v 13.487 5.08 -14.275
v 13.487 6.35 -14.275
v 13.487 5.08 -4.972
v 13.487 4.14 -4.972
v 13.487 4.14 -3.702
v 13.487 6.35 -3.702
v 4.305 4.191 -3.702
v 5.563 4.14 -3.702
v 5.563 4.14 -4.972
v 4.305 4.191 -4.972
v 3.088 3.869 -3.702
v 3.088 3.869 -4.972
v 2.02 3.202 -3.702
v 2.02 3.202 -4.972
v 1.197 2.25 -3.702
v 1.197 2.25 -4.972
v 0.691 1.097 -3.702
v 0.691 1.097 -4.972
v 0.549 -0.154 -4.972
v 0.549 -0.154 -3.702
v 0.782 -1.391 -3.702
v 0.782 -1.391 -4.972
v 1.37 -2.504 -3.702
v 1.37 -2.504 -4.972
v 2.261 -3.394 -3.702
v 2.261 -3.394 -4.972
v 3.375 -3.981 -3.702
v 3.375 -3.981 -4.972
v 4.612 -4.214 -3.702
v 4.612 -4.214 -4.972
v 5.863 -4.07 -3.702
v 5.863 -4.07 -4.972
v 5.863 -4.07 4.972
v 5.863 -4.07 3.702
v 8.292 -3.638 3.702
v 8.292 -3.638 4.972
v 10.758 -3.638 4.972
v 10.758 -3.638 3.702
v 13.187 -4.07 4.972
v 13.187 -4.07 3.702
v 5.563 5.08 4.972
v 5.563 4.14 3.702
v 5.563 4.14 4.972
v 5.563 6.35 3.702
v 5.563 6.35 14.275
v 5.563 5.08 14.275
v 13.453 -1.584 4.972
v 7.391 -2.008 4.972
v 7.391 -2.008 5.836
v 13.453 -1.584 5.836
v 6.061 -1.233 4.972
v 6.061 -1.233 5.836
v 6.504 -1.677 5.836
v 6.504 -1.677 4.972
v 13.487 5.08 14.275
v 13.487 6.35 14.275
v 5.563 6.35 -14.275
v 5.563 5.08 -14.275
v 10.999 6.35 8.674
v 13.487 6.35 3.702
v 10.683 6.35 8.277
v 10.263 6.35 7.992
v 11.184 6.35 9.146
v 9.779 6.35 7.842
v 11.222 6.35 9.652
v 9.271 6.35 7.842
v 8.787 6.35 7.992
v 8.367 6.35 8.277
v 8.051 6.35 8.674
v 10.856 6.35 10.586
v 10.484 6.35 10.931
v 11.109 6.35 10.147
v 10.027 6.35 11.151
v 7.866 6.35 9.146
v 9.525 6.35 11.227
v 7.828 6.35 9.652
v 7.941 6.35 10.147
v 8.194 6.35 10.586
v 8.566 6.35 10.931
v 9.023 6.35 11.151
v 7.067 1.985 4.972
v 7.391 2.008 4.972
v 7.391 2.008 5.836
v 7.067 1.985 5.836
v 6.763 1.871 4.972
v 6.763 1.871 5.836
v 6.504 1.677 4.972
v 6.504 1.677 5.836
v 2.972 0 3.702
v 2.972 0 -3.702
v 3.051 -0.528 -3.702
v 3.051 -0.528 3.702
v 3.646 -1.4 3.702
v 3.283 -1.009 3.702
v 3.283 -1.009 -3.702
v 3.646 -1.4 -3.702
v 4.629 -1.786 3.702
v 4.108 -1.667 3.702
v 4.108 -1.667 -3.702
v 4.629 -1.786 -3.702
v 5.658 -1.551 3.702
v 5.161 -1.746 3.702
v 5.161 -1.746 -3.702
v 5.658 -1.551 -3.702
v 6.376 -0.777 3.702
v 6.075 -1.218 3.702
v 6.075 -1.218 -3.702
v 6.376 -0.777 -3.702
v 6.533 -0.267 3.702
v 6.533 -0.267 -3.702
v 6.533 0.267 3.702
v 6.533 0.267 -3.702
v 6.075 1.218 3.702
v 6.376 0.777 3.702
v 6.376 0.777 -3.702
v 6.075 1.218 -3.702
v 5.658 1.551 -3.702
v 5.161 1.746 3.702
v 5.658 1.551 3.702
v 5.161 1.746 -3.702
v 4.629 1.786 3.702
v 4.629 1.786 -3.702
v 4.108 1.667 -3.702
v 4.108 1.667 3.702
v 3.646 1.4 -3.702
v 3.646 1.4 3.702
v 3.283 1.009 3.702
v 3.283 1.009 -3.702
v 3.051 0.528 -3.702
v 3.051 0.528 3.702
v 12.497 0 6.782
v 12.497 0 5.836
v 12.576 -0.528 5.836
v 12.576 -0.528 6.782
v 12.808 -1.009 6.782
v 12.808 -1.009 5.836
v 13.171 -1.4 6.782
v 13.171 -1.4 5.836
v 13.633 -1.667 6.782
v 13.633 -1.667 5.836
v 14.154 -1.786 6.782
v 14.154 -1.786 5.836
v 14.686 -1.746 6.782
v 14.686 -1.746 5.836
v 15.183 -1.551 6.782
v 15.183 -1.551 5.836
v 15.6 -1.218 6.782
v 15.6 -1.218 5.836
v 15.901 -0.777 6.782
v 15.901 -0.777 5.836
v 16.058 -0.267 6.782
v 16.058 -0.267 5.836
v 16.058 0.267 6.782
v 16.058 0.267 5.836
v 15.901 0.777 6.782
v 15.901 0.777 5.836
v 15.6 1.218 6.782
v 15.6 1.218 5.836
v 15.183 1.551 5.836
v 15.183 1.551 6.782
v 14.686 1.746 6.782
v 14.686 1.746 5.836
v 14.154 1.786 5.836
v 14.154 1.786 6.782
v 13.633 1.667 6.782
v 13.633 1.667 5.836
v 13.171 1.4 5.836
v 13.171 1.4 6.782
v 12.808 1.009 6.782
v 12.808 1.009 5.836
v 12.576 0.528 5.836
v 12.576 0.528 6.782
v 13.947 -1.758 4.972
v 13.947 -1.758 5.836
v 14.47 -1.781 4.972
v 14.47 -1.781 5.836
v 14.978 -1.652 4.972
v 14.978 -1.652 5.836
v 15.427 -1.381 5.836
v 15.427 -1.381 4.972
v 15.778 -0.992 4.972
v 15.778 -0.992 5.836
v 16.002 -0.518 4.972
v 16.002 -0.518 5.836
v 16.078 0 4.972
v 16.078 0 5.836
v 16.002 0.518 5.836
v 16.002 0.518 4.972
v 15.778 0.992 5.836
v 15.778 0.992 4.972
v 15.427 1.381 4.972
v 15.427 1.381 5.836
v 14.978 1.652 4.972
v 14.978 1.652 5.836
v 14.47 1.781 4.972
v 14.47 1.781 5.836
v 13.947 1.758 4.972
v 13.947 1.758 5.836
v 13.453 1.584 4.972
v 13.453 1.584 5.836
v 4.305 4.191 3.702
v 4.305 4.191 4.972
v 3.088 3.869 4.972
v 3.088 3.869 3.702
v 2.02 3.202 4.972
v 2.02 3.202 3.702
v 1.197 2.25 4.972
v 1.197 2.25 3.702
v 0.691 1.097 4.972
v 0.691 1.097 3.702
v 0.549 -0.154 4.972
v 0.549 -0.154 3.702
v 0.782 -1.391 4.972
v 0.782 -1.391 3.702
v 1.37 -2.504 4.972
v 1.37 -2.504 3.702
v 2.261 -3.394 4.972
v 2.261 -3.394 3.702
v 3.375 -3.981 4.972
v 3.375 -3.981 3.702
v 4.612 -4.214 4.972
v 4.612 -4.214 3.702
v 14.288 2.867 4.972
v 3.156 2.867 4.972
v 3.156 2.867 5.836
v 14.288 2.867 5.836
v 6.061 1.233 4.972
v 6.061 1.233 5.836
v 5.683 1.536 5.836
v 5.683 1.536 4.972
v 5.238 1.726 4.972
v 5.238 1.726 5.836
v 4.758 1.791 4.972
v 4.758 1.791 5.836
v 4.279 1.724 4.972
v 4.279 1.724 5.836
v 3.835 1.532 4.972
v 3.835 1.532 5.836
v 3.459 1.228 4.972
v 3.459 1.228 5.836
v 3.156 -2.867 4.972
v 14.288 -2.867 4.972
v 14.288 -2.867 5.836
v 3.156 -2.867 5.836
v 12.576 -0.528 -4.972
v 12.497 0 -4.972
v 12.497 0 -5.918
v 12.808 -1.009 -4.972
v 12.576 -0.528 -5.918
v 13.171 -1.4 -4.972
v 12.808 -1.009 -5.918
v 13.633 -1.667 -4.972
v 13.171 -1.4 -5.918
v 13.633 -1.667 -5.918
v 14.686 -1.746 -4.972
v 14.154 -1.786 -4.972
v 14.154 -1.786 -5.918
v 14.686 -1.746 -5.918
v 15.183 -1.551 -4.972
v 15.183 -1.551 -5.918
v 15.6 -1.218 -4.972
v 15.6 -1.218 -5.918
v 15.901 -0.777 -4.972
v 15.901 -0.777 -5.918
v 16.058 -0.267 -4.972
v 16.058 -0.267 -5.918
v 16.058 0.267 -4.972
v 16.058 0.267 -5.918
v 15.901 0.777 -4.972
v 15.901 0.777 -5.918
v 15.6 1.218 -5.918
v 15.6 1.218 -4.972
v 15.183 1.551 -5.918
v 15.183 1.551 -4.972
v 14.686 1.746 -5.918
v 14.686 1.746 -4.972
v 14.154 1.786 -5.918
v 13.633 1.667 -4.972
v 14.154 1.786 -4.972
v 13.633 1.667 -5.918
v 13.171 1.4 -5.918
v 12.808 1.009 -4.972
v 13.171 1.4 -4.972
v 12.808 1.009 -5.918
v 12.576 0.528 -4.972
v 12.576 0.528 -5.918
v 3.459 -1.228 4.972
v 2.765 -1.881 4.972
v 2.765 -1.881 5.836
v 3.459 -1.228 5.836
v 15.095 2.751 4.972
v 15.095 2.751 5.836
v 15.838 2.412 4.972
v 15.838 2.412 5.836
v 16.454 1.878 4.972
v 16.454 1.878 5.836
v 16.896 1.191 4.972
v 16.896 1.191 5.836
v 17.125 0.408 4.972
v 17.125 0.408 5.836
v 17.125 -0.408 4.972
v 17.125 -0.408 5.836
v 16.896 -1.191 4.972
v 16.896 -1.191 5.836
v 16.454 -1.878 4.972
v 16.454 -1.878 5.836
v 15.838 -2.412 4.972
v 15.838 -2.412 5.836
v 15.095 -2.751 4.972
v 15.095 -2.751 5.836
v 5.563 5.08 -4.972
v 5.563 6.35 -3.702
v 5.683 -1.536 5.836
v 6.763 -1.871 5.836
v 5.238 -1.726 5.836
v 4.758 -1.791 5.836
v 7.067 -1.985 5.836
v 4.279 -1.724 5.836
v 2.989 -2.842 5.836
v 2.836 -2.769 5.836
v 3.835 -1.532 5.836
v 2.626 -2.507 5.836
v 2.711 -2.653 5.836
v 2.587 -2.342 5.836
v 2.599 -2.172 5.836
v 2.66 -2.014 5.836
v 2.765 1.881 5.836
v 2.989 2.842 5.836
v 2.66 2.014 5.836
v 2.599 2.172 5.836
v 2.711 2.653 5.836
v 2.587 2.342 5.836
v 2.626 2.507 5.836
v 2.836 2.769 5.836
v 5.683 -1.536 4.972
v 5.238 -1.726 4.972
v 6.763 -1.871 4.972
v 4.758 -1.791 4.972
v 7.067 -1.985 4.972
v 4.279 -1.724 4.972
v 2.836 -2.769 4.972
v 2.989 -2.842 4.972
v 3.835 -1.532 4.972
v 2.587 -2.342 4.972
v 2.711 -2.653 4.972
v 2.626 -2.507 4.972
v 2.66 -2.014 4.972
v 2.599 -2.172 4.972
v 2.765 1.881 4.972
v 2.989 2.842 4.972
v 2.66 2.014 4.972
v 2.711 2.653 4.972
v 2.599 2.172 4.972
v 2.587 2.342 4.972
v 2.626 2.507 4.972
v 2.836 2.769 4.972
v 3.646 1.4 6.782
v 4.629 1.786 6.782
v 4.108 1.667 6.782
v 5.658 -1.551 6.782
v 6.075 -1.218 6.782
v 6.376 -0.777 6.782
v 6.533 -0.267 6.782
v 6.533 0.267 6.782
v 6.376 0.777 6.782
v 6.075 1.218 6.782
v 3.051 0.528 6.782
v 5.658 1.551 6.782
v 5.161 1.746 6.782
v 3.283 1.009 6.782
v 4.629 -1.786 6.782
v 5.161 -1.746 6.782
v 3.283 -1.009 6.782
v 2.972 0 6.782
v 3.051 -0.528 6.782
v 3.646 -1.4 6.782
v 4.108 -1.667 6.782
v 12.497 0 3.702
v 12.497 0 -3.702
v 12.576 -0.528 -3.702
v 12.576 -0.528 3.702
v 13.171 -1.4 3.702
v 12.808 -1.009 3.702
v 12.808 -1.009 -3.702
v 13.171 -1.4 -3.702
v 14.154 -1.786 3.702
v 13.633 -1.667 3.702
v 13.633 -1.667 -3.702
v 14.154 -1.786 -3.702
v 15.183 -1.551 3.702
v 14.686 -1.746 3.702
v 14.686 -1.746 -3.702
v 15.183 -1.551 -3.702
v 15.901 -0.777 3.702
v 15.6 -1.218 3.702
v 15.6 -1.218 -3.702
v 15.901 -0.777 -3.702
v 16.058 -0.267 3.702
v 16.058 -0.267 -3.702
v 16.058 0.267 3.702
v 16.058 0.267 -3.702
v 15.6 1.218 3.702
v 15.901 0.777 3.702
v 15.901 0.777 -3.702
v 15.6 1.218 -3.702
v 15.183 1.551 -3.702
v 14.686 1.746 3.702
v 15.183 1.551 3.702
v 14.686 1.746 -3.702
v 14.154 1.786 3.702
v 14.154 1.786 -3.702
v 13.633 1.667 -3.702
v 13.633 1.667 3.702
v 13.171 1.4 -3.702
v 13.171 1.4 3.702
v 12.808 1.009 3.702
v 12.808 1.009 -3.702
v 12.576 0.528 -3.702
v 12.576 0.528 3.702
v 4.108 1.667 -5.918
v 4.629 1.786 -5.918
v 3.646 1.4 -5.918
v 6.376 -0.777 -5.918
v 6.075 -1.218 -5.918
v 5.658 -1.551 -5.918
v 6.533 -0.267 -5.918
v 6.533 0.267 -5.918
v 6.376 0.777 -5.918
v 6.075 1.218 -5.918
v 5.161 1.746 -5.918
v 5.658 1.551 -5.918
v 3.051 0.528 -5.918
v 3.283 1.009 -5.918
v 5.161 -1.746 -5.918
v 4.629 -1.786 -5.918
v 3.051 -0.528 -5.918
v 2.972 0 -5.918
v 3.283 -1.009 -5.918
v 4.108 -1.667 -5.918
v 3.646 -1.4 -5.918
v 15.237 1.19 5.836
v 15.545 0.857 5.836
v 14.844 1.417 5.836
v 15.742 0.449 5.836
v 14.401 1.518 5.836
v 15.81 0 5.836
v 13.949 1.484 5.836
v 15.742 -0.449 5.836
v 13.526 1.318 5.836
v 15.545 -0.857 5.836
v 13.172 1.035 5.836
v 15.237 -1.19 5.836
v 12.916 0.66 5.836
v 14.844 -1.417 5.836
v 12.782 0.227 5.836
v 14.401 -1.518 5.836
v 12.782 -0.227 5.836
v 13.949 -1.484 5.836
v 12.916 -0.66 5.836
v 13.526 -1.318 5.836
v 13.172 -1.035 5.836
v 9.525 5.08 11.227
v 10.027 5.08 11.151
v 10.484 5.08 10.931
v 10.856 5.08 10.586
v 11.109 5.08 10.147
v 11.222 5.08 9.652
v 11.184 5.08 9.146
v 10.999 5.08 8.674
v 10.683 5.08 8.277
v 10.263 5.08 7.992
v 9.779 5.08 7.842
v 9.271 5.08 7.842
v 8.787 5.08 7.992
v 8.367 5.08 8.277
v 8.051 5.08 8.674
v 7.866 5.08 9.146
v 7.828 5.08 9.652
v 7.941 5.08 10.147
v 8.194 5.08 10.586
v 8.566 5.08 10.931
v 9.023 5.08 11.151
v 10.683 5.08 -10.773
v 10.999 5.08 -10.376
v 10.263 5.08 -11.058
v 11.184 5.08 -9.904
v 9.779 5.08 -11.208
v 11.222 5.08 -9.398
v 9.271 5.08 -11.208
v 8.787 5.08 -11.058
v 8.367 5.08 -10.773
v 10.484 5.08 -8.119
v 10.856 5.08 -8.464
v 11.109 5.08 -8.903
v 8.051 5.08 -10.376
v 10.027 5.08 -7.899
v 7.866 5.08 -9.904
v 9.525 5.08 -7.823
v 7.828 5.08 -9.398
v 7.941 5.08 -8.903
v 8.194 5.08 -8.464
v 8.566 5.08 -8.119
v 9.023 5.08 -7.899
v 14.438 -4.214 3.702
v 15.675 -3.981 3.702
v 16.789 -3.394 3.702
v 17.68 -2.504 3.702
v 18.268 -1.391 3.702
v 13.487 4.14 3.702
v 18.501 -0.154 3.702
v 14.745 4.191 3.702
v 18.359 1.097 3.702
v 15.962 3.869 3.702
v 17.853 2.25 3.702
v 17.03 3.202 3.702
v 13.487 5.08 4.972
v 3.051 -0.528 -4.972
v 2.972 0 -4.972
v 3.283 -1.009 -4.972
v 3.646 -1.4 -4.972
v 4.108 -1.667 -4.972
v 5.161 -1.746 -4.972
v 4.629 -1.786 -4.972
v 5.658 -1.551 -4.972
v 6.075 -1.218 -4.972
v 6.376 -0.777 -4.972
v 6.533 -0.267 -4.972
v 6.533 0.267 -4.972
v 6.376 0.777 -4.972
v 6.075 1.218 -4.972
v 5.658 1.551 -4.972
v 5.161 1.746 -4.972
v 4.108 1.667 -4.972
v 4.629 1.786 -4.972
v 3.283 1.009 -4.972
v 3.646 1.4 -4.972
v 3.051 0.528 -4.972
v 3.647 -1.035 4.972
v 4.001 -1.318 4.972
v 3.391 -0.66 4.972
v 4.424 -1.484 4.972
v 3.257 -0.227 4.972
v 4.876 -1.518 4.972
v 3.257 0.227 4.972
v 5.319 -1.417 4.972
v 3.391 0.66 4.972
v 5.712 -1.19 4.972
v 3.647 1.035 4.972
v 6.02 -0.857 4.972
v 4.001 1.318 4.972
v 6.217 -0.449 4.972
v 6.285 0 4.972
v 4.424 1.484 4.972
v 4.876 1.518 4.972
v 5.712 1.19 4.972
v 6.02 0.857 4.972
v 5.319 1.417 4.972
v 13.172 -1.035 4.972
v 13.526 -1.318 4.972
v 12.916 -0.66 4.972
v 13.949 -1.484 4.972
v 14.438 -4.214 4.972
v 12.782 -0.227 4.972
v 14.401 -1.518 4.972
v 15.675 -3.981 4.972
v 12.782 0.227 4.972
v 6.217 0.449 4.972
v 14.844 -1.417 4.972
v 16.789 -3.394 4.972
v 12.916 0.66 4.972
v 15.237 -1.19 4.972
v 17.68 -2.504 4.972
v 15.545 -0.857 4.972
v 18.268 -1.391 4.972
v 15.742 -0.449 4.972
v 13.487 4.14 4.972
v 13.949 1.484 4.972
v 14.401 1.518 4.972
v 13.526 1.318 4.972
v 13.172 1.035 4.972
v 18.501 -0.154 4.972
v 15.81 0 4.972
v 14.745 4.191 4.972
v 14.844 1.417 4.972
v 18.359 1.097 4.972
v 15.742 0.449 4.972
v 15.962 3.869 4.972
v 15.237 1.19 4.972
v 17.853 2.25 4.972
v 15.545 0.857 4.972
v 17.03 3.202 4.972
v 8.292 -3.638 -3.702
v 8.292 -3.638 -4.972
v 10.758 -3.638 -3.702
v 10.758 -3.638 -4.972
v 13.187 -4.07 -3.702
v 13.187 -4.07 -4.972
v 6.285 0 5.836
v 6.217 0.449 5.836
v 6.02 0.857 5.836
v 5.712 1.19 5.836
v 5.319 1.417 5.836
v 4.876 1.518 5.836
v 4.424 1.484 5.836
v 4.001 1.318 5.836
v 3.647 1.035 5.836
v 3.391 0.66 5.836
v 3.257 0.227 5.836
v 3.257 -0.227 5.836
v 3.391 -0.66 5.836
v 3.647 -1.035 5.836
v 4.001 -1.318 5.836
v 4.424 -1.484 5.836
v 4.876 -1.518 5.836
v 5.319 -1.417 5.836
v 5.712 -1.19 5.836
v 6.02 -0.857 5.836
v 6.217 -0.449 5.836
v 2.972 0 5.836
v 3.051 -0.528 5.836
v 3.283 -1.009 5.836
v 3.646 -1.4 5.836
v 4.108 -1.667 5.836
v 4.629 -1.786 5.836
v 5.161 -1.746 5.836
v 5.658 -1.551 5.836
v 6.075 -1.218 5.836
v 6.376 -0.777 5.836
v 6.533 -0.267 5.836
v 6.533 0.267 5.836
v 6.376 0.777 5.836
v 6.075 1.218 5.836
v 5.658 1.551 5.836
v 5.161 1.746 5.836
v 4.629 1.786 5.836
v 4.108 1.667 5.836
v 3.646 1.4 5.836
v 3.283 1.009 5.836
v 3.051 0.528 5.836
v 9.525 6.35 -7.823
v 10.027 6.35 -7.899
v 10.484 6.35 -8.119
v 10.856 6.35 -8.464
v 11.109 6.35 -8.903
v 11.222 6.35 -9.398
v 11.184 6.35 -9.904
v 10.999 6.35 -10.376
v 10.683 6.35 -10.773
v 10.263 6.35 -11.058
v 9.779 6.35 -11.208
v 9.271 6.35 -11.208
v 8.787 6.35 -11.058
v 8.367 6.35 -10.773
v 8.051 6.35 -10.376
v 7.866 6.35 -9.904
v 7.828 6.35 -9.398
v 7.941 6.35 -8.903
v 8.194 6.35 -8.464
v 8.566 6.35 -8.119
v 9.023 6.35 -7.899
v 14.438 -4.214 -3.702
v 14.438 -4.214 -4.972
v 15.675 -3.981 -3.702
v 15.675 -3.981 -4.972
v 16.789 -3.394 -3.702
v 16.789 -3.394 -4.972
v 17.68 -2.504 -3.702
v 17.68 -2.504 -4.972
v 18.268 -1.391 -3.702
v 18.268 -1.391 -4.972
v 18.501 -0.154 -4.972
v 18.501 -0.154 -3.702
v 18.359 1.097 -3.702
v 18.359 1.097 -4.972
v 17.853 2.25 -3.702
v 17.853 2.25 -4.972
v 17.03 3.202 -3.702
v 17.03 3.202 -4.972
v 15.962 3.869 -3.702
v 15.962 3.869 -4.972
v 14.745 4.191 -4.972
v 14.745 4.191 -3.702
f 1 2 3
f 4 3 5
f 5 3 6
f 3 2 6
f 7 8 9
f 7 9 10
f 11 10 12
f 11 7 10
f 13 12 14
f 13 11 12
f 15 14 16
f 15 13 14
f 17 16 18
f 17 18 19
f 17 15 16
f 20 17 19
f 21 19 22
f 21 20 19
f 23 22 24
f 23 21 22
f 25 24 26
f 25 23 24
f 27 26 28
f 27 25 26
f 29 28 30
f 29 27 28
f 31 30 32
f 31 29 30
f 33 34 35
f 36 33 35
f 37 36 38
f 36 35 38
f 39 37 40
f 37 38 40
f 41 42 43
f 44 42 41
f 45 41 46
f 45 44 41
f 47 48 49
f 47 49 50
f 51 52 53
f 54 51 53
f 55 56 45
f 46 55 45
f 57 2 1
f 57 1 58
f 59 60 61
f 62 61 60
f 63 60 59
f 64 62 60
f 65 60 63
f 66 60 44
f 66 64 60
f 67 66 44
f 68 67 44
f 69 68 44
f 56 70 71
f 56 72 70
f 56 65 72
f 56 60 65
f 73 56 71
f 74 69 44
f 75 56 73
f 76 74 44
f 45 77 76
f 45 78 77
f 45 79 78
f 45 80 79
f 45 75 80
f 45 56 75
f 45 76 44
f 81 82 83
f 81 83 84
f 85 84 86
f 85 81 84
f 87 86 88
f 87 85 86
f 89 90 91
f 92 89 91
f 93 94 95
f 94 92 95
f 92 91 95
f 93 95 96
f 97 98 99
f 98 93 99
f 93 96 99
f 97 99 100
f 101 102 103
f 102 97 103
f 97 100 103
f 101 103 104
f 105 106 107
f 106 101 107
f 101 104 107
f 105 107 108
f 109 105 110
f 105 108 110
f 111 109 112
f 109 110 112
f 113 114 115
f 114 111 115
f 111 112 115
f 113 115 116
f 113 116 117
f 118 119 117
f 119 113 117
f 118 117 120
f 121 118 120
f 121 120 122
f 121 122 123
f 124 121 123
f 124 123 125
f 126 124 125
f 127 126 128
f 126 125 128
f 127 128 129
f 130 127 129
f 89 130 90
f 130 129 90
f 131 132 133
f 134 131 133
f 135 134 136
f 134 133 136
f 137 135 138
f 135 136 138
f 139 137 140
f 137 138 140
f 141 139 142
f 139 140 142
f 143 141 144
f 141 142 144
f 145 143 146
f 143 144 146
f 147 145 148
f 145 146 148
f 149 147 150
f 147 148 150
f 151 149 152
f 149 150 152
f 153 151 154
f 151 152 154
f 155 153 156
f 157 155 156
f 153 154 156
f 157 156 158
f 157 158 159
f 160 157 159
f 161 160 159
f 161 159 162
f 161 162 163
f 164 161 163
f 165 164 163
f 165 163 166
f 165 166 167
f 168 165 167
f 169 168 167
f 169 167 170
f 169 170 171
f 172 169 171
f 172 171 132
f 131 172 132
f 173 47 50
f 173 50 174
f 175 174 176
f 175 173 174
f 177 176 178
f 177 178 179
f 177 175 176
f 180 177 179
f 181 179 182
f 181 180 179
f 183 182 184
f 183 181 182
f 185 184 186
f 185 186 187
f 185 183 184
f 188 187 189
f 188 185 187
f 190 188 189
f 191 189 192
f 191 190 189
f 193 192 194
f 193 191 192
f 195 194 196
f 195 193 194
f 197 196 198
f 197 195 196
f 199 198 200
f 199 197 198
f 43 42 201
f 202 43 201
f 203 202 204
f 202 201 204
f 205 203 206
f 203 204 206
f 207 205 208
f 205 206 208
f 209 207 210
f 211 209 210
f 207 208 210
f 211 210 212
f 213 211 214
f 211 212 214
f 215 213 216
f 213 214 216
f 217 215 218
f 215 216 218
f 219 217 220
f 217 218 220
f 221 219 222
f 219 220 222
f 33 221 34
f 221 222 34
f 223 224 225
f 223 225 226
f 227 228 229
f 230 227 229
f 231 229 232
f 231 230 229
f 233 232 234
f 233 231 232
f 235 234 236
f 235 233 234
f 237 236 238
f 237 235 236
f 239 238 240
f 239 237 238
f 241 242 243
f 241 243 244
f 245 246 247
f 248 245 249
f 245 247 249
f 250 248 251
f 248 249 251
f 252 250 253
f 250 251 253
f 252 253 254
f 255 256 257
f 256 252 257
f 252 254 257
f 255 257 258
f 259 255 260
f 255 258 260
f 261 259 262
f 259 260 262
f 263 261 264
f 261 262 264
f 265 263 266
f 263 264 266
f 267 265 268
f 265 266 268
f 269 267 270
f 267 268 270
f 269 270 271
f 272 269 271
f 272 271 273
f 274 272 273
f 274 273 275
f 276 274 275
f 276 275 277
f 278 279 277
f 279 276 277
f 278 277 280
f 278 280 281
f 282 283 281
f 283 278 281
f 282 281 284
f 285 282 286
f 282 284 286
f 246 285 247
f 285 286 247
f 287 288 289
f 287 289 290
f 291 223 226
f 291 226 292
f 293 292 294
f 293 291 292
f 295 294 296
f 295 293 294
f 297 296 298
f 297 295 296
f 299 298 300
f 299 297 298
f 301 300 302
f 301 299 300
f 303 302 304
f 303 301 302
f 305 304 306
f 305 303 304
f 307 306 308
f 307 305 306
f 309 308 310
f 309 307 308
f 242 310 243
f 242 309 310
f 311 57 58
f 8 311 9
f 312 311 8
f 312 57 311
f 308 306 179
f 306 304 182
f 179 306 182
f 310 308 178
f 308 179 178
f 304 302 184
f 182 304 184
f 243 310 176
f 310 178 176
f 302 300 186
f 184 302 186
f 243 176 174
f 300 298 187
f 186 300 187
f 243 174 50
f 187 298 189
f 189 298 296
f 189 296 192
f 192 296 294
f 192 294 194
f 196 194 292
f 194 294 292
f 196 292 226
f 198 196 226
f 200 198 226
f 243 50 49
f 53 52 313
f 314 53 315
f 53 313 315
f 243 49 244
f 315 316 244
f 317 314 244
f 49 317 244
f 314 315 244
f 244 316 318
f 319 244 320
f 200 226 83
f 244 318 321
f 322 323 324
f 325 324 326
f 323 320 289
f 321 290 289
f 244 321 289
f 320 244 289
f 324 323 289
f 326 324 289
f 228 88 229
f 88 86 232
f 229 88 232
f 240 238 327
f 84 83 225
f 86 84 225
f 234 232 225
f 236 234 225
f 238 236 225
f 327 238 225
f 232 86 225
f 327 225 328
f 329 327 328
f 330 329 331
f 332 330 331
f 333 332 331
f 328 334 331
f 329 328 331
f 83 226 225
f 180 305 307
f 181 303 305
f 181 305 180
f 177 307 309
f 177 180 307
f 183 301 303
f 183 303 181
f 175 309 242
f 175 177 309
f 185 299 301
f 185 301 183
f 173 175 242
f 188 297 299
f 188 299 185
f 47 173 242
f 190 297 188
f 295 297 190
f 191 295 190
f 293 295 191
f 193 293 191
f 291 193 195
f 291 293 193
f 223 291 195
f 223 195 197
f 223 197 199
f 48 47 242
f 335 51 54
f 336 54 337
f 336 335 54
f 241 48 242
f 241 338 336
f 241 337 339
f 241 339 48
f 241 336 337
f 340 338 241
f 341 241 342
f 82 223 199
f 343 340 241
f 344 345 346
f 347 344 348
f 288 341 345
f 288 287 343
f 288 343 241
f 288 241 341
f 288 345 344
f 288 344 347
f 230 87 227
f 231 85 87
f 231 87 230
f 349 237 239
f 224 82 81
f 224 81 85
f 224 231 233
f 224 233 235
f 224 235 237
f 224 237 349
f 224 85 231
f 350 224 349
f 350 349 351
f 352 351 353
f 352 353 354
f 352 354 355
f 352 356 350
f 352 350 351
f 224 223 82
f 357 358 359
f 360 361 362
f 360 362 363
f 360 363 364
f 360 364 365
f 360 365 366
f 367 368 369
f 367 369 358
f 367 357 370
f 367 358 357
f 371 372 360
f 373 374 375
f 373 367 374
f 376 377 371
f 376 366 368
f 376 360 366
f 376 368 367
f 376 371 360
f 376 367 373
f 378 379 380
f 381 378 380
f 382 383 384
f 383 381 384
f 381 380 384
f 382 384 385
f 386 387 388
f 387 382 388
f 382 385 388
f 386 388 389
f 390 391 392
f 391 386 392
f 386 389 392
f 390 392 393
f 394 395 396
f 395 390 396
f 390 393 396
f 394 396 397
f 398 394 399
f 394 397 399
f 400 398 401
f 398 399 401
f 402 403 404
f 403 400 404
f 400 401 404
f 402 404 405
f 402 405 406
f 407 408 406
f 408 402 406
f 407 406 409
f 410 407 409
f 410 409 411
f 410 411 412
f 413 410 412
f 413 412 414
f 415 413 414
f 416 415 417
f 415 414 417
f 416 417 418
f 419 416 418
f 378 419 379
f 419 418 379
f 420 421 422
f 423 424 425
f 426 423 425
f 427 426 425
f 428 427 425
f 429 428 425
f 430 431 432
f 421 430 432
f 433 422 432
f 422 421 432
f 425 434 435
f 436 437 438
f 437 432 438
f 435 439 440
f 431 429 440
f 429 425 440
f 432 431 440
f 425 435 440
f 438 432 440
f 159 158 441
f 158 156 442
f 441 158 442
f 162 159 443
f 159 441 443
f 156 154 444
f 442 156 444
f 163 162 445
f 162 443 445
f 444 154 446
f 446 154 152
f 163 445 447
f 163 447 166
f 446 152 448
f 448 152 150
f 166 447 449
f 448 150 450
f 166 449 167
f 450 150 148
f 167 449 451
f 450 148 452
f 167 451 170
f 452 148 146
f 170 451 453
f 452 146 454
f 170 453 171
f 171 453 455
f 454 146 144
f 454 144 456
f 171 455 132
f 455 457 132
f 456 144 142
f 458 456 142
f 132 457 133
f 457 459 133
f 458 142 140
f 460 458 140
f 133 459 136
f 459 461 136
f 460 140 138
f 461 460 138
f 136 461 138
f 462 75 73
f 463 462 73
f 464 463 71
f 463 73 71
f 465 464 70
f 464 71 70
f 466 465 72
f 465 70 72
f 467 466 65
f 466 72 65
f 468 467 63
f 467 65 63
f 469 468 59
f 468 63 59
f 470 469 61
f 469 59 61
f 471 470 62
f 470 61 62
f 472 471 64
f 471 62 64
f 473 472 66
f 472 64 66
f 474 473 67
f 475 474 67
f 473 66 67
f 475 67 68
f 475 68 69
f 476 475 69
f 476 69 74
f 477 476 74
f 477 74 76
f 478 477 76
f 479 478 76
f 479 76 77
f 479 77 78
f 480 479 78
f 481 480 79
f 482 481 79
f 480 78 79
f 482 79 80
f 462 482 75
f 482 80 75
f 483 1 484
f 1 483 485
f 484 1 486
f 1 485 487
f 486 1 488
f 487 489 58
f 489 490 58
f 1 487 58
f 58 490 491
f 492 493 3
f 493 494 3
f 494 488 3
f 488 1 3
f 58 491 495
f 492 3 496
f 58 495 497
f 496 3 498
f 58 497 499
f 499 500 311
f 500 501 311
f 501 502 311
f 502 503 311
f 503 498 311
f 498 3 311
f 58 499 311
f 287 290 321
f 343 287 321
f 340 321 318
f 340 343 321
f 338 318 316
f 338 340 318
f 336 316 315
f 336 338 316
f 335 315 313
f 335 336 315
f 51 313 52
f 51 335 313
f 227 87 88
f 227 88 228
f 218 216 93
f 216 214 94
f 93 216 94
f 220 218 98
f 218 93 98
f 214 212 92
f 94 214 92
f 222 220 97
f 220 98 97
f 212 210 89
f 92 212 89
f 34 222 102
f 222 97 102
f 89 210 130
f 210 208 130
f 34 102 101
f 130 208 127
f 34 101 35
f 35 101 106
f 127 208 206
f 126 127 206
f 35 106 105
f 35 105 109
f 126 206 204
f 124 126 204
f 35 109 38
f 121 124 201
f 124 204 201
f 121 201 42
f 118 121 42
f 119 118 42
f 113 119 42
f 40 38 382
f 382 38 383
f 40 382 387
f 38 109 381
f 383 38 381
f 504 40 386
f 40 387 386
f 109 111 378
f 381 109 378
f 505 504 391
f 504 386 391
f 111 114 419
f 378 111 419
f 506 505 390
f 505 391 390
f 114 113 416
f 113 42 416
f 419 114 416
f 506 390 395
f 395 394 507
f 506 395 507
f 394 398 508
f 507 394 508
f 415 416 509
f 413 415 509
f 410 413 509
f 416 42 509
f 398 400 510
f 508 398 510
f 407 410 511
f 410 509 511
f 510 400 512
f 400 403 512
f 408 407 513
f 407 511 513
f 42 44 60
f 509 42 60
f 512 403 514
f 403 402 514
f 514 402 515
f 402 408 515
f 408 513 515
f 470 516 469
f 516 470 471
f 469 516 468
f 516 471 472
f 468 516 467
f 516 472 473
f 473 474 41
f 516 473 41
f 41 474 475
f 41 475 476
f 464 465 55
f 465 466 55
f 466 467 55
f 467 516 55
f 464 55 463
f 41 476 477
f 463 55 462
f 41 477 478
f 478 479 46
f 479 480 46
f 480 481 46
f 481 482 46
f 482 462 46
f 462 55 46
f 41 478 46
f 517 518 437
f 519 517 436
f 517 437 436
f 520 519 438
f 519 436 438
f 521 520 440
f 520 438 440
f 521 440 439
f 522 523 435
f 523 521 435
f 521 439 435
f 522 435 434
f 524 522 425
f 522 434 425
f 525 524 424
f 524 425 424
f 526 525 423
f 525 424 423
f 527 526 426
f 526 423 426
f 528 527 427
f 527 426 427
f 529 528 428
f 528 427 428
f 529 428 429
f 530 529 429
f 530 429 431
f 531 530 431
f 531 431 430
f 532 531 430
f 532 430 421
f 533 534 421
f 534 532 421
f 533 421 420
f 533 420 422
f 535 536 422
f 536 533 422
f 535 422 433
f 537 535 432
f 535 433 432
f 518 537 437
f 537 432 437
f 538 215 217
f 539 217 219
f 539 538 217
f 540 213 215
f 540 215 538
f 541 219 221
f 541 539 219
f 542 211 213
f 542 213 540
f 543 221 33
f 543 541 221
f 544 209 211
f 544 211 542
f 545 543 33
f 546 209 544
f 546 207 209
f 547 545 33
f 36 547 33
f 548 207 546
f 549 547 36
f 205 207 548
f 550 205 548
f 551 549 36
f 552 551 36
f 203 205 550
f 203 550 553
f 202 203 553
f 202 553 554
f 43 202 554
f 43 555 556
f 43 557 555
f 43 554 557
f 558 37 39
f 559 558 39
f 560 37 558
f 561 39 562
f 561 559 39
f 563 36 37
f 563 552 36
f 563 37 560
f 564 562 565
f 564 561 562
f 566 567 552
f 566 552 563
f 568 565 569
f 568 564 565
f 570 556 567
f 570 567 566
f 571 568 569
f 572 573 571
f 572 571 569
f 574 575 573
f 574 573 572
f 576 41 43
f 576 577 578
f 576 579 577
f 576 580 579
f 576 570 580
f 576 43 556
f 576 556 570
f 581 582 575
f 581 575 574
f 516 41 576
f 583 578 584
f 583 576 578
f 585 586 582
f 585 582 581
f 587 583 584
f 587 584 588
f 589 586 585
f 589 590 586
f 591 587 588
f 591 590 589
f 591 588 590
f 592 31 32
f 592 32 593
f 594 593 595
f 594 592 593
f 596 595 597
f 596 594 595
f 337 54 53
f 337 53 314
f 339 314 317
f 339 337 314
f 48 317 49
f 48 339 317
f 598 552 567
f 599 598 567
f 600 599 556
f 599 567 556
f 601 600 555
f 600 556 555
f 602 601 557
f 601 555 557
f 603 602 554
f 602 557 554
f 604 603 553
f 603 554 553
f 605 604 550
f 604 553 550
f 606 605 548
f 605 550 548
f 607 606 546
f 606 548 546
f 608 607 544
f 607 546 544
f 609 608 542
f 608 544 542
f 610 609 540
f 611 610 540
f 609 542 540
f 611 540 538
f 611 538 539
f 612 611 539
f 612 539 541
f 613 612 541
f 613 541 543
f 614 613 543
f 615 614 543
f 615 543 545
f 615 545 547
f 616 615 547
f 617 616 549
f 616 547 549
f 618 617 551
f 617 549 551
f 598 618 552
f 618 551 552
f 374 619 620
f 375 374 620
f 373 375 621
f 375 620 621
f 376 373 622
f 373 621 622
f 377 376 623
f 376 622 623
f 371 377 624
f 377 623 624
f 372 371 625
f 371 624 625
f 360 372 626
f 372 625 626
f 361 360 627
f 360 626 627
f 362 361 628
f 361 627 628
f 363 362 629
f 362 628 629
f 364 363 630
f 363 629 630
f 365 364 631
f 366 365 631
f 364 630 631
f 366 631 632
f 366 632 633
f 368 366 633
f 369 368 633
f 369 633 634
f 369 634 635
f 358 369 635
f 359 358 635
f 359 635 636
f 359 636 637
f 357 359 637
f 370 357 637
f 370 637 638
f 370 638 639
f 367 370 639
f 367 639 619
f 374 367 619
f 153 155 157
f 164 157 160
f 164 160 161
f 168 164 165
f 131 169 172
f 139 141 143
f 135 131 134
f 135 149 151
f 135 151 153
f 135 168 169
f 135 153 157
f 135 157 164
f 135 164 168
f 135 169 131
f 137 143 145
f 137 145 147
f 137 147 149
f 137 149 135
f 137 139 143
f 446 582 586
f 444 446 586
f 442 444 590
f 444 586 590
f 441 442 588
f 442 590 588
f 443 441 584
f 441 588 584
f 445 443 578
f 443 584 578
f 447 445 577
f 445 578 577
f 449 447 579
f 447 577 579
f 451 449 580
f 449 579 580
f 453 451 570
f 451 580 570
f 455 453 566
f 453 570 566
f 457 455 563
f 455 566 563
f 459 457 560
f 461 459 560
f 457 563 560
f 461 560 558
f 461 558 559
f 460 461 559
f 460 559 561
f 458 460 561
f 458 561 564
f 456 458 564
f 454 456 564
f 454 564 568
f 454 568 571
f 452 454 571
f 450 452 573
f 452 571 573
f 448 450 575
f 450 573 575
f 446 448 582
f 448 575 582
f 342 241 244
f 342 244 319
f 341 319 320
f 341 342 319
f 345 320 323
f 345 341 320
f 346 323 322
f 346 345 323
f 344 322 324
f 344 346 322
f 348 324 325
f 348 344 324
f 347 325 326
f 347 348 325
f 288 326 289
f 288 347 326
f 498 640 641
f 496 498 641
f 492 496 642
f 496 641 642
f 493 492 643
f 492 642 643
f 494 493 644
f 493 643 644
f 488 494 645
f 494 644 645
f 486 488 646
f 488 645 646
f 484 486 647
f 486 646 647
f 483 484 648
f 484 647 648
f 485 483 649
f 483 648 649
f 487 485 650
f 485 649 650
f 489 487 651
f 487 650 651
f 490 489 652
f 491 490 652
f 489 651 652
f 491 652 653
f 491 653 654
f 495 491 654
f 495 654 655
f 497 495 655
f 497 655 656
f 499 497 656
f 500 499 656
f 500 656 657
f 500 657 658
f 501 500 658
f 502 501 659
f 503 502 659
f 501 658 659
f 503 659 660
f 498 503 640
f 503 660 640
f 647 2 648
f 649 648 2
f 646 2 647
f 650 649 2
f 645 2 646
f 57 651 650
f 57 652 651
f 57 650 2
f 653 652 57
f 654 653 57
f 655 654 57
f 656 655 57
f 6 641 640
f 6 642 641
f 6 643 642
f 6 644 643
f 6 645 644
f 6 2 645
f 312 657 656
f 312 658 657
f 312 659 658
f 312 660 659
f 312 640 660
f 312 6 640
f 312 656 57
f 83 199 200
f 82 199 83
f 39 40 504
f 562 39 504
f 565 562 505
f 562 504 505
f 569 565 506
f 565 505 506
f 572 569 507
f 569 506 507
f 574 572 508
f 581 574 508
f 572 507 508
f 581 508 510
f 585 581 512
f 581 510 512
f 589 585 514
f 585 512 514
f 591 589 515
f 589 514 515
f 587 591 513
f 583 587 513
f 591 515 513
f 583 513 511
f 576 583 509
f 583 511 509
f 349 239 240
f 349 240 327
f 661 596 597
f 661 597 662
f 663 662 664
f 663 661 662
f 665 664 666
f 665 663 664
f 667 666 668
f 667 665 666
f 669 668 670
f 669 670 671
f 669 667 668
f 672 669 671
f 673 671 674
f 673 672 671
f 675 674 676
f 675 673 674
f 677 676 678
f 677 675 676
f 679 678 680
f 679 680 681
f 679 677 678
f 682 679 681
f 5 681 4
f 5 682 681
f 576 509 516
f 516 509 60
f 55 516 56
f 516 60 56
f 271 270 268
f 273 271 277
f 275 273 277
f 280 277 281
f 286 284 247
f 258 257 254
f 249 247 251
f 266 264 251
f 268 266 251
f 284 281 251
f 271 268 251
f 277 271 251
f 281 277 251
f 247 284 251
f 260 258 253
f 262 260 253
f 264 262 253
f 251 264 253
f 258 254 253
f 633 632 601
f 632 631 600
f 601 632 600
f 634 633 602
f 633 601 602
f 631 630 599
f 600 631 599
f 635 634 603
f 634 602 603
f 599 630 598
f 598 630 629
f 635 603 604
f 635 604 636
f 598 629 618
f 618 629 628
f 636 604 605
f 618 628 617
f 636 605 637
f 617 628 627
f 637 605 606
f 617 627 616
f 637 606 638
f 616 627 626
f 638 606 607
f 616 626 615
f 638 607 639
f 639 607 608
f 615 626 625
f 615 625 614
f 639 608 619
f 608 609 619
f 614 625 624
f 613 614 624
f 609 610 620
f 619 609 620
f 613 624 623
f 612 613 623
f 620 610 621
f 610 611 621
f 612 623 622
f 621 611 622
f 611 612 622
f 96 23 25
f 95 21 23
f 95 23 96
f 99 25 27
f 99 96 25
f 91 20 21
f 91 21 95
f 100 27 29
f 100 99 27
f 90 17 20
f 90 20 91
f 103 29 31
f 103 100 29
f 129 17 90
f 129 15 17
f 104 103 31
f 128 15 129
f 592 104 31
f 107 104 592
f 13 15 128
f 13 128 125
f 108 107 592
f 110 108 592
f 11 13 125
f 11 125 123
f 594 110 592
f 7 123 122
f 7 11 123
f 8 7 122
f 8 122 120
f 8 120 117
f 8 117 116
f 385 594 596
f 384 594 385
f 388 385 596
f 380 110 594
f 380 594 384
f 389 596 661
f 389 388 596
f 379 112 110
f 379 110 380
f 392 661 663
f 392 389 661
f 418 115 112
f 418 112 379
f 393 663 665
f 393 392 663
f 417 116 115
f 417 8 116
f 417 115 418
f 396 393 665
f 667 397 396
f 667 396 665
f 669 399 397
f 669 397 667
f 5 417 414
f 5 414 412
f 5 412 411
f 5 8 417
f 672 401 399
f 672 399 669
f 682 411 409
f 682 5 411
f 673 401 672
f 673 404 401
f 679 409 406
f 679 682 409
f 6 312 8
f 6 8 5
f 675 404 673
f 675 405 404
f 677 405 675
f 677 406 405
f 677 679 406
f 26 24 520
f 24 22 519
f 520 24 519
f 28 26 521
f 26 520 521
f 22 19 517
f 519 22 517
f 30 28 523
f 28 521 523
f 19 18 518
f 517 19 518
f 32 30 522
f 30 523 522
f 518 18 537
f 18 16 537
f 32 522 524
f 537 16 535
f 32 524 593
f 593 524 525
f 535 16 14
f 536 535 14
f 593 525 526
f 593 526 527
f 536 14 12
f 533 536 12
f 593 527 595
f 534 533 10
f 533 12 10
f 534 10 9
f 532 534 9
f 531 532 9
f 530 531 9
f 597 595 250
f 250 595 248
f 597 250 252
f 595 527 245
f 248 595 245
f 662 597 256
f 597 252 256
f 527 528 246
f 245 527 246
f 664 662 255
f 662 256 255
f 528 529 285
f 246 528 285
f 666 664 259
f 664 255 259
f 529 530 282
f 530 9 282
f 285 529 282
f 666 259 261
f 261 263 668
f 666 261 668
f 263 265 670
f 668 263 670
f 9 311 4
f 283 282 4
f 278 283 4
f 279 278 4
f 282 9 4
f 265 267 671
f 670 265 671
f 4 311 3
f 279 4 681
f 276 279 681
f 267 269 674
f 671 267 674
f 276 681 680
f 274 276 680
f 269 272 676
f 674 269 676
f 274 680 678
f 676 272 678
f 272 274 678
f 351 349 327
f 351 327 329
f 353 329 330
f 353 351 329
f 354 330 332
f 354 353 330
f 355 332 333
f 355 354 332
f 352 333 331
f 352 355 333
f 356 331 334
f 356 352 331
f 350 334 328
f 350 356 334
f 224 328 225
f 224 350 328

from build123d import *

# Parameters (mm, degrees)
SKETCH4_R                  = 2.54
SKETCH4_R_2                = 1.8161
BOSS_EXTRUDE1_DEPTH        = 2.38125
SKETCH5_R                  = 1.7907
BOSS_EXTRUDE2_DEPTH        = 1.27
LPATTERN1_COUNT            = 2
LPATTERN1_PITCH            = 9.525
SKETCH7_R                  = 1.7907
BOSS_EXTRUDE3_DEPTH        = 1.27
MIRROR1_START              = 3.70205
MIRROR1_OUTLINE_R          = 1.7907
MIRROR1_DEPTH              = 1.27
BOSS_EXTRUDE4_DEPTH        = 6.7818
BOSS_EXTRUDE4_DEPTH_BACK   = 5.9182
SKETCH8_R                  = 1.7907
BOSS_EXTRUDE4_2_DEPTH      = 6.7818
BOSS_EXTRUDE4_2_DEPTH_BACK = 5.9182
BOSS_EXTRUDE5_DEPTH        = 0.8636
SKETCH12_R                 = 1.7907
SKETCH12_R_2               = 1.522095
CUT_EXTRUDE1_DEPTH         = 0.8636
SKETCH13_W                 = 7.9248
SKETCH13_H                 = 10.57275
SKETCH13_R                 = 1.7018
BOSS_EXTRUDE6_DEPTH        = 1.27
BOSS_EXTRUDE6_2_DEPTH      = 1.27
BOSS_EXTRUDE7_REACH        = 27.151
SKETCH14_W                 = 7.9248
SKETCH14_H                 = 1.27
BOSS_EXTRUDE8_REACH        = 27.151
SKETCH15_W                 = 7.9248
SKETCH15_H                 = 1.27


# Read off the part's stored shape, not the designer's step: Mirror1
with BuildPart() as part:
    # Sketch4 → Boss-Extrude1 (new, symmetric)
    with BuildSketch(Plane.XY):
        with Locations(Location((4.7625, 0, 0), (0, 0, 180))):
            Circle(SKETCH4_R)
        with Locations(Location((4.7625, 0, 0), (0, 0, 180))):
            Circle(SKETCH4_R_2, mode=Mode.SUBTRACT)
    extrude(amount=BOSS_EXTRUDE1_DEPTH, both=True)


with BuildPart() as body_2:
    # Sketch5 → Boss-Extrude2 (new body)
    with BuildSketch(Plane.XY.offset(2.38125)):
        with BuildLine():
            ThreePointArc((-3.66203184, 4.070257828), (-8.9789, 0), (-3.66203184, -4.070257828))
            ThreePointArc((-3.66203184, -4.070257828), (0, -3.58394), (3.66203184, -4.070257828))
            ThreePointArc((3.66203184, -4.070257828), (8.9789, 0), (3.66203184, 4.070257828))
            ThreePointArc((3.66203184, 4.070257828), (0, 3.58394), (-3.66203184, 4.070257828))
        make_face()
        with Locations((-4.7625, 0)):
            Circle(SKETCH5_R, mode=Mode.SUBTRACT)
        with Locations((4.7625, 0)):
            Circle(SKETCH5_R, mode=Mode.SUBTRACT)
    extrude(amount=BOSS_EXTRUDE2_DEPTH)


with BuildPart() as lpattern1_1:
    # LPattern1: pattern copy
    add(part.part.moved(Location(Vector(1, 0, 0) * (1 * LPATTERN1_PITCH))))


with BuildPart() as body_4:
    # Sketch7 → Boss-Extrude3 (new body)
    with BuildSketch(Plane.XY.offset(-3.70205)):
        with BuildLine():
            ThreePointArc((5.86296816, 4.070257828), (0.5461, 0), (5.86296816, -4.070257828))
            ThreePointArc((5.86296816, -4.070257828), (9.525, -3.58394), (13.18703184, -4.070257828))
            ThreePointArc((13.18703184, -4.070257828), (18.5039, 0), (13.18703184, 4.070257828))
            ThreePointArc((13.18703184, 4.070257828), (9.525, 3.58394), (5.86296816, 4.070257828))
        make_face()
        with Locations((4.7625, 0)):
            Circle(SKETCH7_R, mode=Mode.SUBTRACT)
        with Locations((14.2875, 0)):
            Circle(SKETCH7_R, mode=Mode.SUBTRACT)
    extrude(amount=-BOSS_EXTRUDE3_DEPTH)


with BuildPart() as body_5:
    # Mirror1 outline → Mirror1 (new body)
    with BuildSketch(Plane.XY.offset(MIRROR1_START)):
        with BuildLine():
            ThreePointArc((5.86296816, 4.070257828), (0.5461, 0), (5.86296816, -4.070257828))
            ThreePointArc((5.86296816, -4.070257828), (9.525, -3.58394), (13.18703184, -4.070257828))
            ThreePointArc((13.18703184, -4.070257828), (18.5039, 0), (13.18703184, 4.070257828))
            ThreePointArc((13.18703184, 4.070257828), (9.525, 3.58394), (5.86296816, 4.070257828))
        make_face()
        with Locations((4.7625, 0)):
            Circle(MIRROR1_OUTLINE_R, mode=Mode.SUBTRACT)
        with Locations((14.2875, 0)):
            Circle(MIRROR1_OUTLINE_R, mode=Mode.SUBTRACT)
    extrude(amount=MIRROR1_DEPTH)


with BuildPart() as body_3:
    # Sketch8 → Boss-Extrude4 (new, two sides: drawn at the far end of the back side and taken through both)
    with BuildSketch(Plane.XY.offset(-BOSS_EXTRUDE4_DEPTH_BACK)):
        with Locations(Location((4.7625, 0, 0), (0, 0, 180))):
            Circle(SKETCH8_R)
    extrude(amount=BOSS_EXTRUDE4_DEPTH + BOSS_EXTRUDE4_DEPTH_BACK)


with BuildPart() as body_4_2:
    # Sketch8 → Boss-Extrude4 2 (new, two sides: drawn at the far end of the back side and taken through both)
    with BuildSketch(Plane.XY.offset(-BOSS_EXTRUDE4_2_DEPTH_BACK)):
        with Locations(Location((14.2875, 0, 0), (0, 0, 180))):
            Circle(SKETCH8_R)
    extrude(amount=BOSS_EXTRUDE4_2_DEPTH + BOSS_EXTRUDE4_2_DEPTH_BACK)


with BuildPart() as body_5_2:
    # Sketch10 → Boss-Extrude5 (new body)
    with BuildSketch(Plane.XY.offset(4.97205)):
        with BuildLine():
            Line((14.2875, -2.867152), (3.156330824, -2.867152))
            ThreePointArc((3.156330824, -2.867152), (2.625769403, -2.506843945), (2.765041086, -1.880808232))
            Line((2.765041086, -1.880808232), (3.654344952, -1.043439303))
            ThreePointArc((3.654344952, -1.043439303), (4.7625, -1.522095), (5.870655048, -1.043439303))
            Line((5.870655048, -1.043439303), (6.503729881, -1.676514136))
            ThreePointArc((6.503729881, -1.676514136), (6.911155975, -1.938579406), (7.390574638, -2.008091804))
            Line((7.390574638, -2.008091804), (14.39367598, -1.518387253))
            ThreePointArc((14.39367598, -1.518387253), (15.809595, 0), (14.39367598, 1.518387253))
            Line((14.39367598, 1.518387253), (7.390574638, 2.008091804))
            ThreePointArc((7.390574638, 2.008091804), (6.911155975, 1.938579406), (6.503729881, 1.676514136))
            Line((6.503729881, 1.676514136), (5.870655048, 1.043439303))
            ThreePointArc((5.870655048, 1.043439303), (4.7625, 1.522095), (3.654344952, 1.043439303))
            Line((3.654344952, 1.043439303), (2.765041086, 1.880808232))
            ThreePointArc((2.765041086, 1.880808232), (2.625769403, 2.506843945), (3.156330824, 2.867152))
            Line((3.156330824, 2.867152), (14.2875, 2.867152))
            ThreePointArc((14.2875, 2.867152), (17.154652, 0), (14.2875, -2.867152))
        make_face()
    extrude(amount=BOSS_EXTRUDE5_DEPTH)


with BuildPart() as cut_extrude1_tool:
    # Sketch12 → Cut-Extrude1 (new body)
    # profile 1 of 2: a face of its own
    with BuildSketch(Plane.XY.offset(4.97205)):
        with Locations(Location((4.7625, 0, 0), (0, 0, 180))):
            Circle(SKETCH12_R)
        with Locations((4.7625, 0)):
            Circle(SKETCH12_R_2, mode=Mode.SUBTRACT)
    # profile 2 of 2: a face of its own
    with BuildSketch(Plane.XY.offset(4.97205)):
        with Locations(Location((14.2875, 0, 0), (0, 0, 180))):
            Circle(SKETCH12_R)
        with Locations((14.2875, 0)):
            Circle(SKETCH12_R_2, mode=Mode.SUBTRACT)
    extrude(amount=CUT_EXTRUDE1_DEPTH)


with BuildPart() as body_3_1:
    add(body_3.part)

    # Cut-Extrude1: cut by cut_extrude1_tool
    add(cut_extrude1_tool.part, mode=Mode.SUBTRACT)


with BuildPart() as body_4_2_1:
    add(body_4_2.part)

    # Cut-Extrude1: cut by cut_extrude1_tool
    add(cut_extrude1_tool.part, mode=Mode.SUBTRACT)


with BuildPart() as body_5_2_1:
    add(body_5_2.part)

    # Cut-Extrude1: cut by cut_extrude1_tool
    add(cut_extrude1_tool.part, mode=Mode.SUBTRACT)


with BuildPart() as body_4_1:
    add(body_4.part)

    # Combine3: union body 5, body 4 2, body 3
    add(body_5.part)
    add(body_4_2_1.part)
    add(body_3_1.part)

    # Sketch14 → Boss-Extrude7 (add, up to next)
    with BuildSketch(Plane.XZ.offset(-5.08), mode=Mode.PRIVATE) as boss_extrude7_sk1:
        with Locations((9.525, -4.33705)):
            Rectangle(SKETCH14_W, SKETCH14_H)
    boss_extrude7_tool1 = extrude(boss_extrude7_sk1.sketch, amount=BOSS_EXTRUDE7_REACH, mode=Mode.PRIVATE) - body_4_1.part


with BuildPart() as body_3_2:
    # Sketch13 → Boss-Extrude6 (new body)
    with BuildSketch(Plane(origin=(0, 6.35, 0), x_dir=(-1, 0, 0), z_dir=(0, 1, 0))):
        with Locations((-9.525, -8.988425)):
            Rectangle(SKETCH13_W, SKETCH13_H)
        with Locations(Location((-9.525, -9.525, 0), (0, 0, 90))):
            Circle(SKETCH13_R, mode=Mode.SUBTRACT)
    extrude(amount=-BOSS_EXTRUDE6_DEPTH)


with BuildPart() as body_4_3:
    # Sketch13 → Boss-Extrude6 2 (new body)
    with BuildSketch(Plane(origin=(0, 6.35, 0), x_dir=(-1, 0, 0), z_dir=(0, 1, 0))):
        with Locations((-9.525, 8.988425)):
            Rectangle(SKETCH13_W, SKETCH13_H)
        with Locations(Location((-9.525, 9.525, 0), (0, 0, 90))):
            Circle(SKETCH13_R, mode=Mode.SUBTRACT)
    extrude(amount=-BOSS_EXTRUDE6_2_DEPTH)


with BuildPart() as body_4_4:
    add(body_4_1.part)

    add(body_3_2.part)  # Boss-Extrude7 merges body 3 2
    add(boss_extrude7_tool1.solids().sort_by_distance((9.525, 5.08, -4.33705))[0])

    # Sketch15 → Boss-Extrude8 (add, up to next)
    with BuildSketch(Plane.XZ.offset(-5.08), mode=Mode.PRIVATE) as boss_extrude8_sk1:
        with Locations((9.525, 4.33705)):
            Rectangle(SKETCH15_W, SKETCH15_H)
    boss_extrude8_tool1 = extrude(boss_extrude8_sk1.sketch, amount=BOSS_EXTRUDE8_REACH, mode=Mode.PRIVATE) - body_4_4.part

    add(body_4_3.part)  # Boss-Extrude8 merges body 4 3
    add(boss_extrude8_tool1.solids().sort_by_distance((9.525, 5.08, 4.33705))[0])


solid = Compound([body_5_2_1.part, body_4_4.part])
